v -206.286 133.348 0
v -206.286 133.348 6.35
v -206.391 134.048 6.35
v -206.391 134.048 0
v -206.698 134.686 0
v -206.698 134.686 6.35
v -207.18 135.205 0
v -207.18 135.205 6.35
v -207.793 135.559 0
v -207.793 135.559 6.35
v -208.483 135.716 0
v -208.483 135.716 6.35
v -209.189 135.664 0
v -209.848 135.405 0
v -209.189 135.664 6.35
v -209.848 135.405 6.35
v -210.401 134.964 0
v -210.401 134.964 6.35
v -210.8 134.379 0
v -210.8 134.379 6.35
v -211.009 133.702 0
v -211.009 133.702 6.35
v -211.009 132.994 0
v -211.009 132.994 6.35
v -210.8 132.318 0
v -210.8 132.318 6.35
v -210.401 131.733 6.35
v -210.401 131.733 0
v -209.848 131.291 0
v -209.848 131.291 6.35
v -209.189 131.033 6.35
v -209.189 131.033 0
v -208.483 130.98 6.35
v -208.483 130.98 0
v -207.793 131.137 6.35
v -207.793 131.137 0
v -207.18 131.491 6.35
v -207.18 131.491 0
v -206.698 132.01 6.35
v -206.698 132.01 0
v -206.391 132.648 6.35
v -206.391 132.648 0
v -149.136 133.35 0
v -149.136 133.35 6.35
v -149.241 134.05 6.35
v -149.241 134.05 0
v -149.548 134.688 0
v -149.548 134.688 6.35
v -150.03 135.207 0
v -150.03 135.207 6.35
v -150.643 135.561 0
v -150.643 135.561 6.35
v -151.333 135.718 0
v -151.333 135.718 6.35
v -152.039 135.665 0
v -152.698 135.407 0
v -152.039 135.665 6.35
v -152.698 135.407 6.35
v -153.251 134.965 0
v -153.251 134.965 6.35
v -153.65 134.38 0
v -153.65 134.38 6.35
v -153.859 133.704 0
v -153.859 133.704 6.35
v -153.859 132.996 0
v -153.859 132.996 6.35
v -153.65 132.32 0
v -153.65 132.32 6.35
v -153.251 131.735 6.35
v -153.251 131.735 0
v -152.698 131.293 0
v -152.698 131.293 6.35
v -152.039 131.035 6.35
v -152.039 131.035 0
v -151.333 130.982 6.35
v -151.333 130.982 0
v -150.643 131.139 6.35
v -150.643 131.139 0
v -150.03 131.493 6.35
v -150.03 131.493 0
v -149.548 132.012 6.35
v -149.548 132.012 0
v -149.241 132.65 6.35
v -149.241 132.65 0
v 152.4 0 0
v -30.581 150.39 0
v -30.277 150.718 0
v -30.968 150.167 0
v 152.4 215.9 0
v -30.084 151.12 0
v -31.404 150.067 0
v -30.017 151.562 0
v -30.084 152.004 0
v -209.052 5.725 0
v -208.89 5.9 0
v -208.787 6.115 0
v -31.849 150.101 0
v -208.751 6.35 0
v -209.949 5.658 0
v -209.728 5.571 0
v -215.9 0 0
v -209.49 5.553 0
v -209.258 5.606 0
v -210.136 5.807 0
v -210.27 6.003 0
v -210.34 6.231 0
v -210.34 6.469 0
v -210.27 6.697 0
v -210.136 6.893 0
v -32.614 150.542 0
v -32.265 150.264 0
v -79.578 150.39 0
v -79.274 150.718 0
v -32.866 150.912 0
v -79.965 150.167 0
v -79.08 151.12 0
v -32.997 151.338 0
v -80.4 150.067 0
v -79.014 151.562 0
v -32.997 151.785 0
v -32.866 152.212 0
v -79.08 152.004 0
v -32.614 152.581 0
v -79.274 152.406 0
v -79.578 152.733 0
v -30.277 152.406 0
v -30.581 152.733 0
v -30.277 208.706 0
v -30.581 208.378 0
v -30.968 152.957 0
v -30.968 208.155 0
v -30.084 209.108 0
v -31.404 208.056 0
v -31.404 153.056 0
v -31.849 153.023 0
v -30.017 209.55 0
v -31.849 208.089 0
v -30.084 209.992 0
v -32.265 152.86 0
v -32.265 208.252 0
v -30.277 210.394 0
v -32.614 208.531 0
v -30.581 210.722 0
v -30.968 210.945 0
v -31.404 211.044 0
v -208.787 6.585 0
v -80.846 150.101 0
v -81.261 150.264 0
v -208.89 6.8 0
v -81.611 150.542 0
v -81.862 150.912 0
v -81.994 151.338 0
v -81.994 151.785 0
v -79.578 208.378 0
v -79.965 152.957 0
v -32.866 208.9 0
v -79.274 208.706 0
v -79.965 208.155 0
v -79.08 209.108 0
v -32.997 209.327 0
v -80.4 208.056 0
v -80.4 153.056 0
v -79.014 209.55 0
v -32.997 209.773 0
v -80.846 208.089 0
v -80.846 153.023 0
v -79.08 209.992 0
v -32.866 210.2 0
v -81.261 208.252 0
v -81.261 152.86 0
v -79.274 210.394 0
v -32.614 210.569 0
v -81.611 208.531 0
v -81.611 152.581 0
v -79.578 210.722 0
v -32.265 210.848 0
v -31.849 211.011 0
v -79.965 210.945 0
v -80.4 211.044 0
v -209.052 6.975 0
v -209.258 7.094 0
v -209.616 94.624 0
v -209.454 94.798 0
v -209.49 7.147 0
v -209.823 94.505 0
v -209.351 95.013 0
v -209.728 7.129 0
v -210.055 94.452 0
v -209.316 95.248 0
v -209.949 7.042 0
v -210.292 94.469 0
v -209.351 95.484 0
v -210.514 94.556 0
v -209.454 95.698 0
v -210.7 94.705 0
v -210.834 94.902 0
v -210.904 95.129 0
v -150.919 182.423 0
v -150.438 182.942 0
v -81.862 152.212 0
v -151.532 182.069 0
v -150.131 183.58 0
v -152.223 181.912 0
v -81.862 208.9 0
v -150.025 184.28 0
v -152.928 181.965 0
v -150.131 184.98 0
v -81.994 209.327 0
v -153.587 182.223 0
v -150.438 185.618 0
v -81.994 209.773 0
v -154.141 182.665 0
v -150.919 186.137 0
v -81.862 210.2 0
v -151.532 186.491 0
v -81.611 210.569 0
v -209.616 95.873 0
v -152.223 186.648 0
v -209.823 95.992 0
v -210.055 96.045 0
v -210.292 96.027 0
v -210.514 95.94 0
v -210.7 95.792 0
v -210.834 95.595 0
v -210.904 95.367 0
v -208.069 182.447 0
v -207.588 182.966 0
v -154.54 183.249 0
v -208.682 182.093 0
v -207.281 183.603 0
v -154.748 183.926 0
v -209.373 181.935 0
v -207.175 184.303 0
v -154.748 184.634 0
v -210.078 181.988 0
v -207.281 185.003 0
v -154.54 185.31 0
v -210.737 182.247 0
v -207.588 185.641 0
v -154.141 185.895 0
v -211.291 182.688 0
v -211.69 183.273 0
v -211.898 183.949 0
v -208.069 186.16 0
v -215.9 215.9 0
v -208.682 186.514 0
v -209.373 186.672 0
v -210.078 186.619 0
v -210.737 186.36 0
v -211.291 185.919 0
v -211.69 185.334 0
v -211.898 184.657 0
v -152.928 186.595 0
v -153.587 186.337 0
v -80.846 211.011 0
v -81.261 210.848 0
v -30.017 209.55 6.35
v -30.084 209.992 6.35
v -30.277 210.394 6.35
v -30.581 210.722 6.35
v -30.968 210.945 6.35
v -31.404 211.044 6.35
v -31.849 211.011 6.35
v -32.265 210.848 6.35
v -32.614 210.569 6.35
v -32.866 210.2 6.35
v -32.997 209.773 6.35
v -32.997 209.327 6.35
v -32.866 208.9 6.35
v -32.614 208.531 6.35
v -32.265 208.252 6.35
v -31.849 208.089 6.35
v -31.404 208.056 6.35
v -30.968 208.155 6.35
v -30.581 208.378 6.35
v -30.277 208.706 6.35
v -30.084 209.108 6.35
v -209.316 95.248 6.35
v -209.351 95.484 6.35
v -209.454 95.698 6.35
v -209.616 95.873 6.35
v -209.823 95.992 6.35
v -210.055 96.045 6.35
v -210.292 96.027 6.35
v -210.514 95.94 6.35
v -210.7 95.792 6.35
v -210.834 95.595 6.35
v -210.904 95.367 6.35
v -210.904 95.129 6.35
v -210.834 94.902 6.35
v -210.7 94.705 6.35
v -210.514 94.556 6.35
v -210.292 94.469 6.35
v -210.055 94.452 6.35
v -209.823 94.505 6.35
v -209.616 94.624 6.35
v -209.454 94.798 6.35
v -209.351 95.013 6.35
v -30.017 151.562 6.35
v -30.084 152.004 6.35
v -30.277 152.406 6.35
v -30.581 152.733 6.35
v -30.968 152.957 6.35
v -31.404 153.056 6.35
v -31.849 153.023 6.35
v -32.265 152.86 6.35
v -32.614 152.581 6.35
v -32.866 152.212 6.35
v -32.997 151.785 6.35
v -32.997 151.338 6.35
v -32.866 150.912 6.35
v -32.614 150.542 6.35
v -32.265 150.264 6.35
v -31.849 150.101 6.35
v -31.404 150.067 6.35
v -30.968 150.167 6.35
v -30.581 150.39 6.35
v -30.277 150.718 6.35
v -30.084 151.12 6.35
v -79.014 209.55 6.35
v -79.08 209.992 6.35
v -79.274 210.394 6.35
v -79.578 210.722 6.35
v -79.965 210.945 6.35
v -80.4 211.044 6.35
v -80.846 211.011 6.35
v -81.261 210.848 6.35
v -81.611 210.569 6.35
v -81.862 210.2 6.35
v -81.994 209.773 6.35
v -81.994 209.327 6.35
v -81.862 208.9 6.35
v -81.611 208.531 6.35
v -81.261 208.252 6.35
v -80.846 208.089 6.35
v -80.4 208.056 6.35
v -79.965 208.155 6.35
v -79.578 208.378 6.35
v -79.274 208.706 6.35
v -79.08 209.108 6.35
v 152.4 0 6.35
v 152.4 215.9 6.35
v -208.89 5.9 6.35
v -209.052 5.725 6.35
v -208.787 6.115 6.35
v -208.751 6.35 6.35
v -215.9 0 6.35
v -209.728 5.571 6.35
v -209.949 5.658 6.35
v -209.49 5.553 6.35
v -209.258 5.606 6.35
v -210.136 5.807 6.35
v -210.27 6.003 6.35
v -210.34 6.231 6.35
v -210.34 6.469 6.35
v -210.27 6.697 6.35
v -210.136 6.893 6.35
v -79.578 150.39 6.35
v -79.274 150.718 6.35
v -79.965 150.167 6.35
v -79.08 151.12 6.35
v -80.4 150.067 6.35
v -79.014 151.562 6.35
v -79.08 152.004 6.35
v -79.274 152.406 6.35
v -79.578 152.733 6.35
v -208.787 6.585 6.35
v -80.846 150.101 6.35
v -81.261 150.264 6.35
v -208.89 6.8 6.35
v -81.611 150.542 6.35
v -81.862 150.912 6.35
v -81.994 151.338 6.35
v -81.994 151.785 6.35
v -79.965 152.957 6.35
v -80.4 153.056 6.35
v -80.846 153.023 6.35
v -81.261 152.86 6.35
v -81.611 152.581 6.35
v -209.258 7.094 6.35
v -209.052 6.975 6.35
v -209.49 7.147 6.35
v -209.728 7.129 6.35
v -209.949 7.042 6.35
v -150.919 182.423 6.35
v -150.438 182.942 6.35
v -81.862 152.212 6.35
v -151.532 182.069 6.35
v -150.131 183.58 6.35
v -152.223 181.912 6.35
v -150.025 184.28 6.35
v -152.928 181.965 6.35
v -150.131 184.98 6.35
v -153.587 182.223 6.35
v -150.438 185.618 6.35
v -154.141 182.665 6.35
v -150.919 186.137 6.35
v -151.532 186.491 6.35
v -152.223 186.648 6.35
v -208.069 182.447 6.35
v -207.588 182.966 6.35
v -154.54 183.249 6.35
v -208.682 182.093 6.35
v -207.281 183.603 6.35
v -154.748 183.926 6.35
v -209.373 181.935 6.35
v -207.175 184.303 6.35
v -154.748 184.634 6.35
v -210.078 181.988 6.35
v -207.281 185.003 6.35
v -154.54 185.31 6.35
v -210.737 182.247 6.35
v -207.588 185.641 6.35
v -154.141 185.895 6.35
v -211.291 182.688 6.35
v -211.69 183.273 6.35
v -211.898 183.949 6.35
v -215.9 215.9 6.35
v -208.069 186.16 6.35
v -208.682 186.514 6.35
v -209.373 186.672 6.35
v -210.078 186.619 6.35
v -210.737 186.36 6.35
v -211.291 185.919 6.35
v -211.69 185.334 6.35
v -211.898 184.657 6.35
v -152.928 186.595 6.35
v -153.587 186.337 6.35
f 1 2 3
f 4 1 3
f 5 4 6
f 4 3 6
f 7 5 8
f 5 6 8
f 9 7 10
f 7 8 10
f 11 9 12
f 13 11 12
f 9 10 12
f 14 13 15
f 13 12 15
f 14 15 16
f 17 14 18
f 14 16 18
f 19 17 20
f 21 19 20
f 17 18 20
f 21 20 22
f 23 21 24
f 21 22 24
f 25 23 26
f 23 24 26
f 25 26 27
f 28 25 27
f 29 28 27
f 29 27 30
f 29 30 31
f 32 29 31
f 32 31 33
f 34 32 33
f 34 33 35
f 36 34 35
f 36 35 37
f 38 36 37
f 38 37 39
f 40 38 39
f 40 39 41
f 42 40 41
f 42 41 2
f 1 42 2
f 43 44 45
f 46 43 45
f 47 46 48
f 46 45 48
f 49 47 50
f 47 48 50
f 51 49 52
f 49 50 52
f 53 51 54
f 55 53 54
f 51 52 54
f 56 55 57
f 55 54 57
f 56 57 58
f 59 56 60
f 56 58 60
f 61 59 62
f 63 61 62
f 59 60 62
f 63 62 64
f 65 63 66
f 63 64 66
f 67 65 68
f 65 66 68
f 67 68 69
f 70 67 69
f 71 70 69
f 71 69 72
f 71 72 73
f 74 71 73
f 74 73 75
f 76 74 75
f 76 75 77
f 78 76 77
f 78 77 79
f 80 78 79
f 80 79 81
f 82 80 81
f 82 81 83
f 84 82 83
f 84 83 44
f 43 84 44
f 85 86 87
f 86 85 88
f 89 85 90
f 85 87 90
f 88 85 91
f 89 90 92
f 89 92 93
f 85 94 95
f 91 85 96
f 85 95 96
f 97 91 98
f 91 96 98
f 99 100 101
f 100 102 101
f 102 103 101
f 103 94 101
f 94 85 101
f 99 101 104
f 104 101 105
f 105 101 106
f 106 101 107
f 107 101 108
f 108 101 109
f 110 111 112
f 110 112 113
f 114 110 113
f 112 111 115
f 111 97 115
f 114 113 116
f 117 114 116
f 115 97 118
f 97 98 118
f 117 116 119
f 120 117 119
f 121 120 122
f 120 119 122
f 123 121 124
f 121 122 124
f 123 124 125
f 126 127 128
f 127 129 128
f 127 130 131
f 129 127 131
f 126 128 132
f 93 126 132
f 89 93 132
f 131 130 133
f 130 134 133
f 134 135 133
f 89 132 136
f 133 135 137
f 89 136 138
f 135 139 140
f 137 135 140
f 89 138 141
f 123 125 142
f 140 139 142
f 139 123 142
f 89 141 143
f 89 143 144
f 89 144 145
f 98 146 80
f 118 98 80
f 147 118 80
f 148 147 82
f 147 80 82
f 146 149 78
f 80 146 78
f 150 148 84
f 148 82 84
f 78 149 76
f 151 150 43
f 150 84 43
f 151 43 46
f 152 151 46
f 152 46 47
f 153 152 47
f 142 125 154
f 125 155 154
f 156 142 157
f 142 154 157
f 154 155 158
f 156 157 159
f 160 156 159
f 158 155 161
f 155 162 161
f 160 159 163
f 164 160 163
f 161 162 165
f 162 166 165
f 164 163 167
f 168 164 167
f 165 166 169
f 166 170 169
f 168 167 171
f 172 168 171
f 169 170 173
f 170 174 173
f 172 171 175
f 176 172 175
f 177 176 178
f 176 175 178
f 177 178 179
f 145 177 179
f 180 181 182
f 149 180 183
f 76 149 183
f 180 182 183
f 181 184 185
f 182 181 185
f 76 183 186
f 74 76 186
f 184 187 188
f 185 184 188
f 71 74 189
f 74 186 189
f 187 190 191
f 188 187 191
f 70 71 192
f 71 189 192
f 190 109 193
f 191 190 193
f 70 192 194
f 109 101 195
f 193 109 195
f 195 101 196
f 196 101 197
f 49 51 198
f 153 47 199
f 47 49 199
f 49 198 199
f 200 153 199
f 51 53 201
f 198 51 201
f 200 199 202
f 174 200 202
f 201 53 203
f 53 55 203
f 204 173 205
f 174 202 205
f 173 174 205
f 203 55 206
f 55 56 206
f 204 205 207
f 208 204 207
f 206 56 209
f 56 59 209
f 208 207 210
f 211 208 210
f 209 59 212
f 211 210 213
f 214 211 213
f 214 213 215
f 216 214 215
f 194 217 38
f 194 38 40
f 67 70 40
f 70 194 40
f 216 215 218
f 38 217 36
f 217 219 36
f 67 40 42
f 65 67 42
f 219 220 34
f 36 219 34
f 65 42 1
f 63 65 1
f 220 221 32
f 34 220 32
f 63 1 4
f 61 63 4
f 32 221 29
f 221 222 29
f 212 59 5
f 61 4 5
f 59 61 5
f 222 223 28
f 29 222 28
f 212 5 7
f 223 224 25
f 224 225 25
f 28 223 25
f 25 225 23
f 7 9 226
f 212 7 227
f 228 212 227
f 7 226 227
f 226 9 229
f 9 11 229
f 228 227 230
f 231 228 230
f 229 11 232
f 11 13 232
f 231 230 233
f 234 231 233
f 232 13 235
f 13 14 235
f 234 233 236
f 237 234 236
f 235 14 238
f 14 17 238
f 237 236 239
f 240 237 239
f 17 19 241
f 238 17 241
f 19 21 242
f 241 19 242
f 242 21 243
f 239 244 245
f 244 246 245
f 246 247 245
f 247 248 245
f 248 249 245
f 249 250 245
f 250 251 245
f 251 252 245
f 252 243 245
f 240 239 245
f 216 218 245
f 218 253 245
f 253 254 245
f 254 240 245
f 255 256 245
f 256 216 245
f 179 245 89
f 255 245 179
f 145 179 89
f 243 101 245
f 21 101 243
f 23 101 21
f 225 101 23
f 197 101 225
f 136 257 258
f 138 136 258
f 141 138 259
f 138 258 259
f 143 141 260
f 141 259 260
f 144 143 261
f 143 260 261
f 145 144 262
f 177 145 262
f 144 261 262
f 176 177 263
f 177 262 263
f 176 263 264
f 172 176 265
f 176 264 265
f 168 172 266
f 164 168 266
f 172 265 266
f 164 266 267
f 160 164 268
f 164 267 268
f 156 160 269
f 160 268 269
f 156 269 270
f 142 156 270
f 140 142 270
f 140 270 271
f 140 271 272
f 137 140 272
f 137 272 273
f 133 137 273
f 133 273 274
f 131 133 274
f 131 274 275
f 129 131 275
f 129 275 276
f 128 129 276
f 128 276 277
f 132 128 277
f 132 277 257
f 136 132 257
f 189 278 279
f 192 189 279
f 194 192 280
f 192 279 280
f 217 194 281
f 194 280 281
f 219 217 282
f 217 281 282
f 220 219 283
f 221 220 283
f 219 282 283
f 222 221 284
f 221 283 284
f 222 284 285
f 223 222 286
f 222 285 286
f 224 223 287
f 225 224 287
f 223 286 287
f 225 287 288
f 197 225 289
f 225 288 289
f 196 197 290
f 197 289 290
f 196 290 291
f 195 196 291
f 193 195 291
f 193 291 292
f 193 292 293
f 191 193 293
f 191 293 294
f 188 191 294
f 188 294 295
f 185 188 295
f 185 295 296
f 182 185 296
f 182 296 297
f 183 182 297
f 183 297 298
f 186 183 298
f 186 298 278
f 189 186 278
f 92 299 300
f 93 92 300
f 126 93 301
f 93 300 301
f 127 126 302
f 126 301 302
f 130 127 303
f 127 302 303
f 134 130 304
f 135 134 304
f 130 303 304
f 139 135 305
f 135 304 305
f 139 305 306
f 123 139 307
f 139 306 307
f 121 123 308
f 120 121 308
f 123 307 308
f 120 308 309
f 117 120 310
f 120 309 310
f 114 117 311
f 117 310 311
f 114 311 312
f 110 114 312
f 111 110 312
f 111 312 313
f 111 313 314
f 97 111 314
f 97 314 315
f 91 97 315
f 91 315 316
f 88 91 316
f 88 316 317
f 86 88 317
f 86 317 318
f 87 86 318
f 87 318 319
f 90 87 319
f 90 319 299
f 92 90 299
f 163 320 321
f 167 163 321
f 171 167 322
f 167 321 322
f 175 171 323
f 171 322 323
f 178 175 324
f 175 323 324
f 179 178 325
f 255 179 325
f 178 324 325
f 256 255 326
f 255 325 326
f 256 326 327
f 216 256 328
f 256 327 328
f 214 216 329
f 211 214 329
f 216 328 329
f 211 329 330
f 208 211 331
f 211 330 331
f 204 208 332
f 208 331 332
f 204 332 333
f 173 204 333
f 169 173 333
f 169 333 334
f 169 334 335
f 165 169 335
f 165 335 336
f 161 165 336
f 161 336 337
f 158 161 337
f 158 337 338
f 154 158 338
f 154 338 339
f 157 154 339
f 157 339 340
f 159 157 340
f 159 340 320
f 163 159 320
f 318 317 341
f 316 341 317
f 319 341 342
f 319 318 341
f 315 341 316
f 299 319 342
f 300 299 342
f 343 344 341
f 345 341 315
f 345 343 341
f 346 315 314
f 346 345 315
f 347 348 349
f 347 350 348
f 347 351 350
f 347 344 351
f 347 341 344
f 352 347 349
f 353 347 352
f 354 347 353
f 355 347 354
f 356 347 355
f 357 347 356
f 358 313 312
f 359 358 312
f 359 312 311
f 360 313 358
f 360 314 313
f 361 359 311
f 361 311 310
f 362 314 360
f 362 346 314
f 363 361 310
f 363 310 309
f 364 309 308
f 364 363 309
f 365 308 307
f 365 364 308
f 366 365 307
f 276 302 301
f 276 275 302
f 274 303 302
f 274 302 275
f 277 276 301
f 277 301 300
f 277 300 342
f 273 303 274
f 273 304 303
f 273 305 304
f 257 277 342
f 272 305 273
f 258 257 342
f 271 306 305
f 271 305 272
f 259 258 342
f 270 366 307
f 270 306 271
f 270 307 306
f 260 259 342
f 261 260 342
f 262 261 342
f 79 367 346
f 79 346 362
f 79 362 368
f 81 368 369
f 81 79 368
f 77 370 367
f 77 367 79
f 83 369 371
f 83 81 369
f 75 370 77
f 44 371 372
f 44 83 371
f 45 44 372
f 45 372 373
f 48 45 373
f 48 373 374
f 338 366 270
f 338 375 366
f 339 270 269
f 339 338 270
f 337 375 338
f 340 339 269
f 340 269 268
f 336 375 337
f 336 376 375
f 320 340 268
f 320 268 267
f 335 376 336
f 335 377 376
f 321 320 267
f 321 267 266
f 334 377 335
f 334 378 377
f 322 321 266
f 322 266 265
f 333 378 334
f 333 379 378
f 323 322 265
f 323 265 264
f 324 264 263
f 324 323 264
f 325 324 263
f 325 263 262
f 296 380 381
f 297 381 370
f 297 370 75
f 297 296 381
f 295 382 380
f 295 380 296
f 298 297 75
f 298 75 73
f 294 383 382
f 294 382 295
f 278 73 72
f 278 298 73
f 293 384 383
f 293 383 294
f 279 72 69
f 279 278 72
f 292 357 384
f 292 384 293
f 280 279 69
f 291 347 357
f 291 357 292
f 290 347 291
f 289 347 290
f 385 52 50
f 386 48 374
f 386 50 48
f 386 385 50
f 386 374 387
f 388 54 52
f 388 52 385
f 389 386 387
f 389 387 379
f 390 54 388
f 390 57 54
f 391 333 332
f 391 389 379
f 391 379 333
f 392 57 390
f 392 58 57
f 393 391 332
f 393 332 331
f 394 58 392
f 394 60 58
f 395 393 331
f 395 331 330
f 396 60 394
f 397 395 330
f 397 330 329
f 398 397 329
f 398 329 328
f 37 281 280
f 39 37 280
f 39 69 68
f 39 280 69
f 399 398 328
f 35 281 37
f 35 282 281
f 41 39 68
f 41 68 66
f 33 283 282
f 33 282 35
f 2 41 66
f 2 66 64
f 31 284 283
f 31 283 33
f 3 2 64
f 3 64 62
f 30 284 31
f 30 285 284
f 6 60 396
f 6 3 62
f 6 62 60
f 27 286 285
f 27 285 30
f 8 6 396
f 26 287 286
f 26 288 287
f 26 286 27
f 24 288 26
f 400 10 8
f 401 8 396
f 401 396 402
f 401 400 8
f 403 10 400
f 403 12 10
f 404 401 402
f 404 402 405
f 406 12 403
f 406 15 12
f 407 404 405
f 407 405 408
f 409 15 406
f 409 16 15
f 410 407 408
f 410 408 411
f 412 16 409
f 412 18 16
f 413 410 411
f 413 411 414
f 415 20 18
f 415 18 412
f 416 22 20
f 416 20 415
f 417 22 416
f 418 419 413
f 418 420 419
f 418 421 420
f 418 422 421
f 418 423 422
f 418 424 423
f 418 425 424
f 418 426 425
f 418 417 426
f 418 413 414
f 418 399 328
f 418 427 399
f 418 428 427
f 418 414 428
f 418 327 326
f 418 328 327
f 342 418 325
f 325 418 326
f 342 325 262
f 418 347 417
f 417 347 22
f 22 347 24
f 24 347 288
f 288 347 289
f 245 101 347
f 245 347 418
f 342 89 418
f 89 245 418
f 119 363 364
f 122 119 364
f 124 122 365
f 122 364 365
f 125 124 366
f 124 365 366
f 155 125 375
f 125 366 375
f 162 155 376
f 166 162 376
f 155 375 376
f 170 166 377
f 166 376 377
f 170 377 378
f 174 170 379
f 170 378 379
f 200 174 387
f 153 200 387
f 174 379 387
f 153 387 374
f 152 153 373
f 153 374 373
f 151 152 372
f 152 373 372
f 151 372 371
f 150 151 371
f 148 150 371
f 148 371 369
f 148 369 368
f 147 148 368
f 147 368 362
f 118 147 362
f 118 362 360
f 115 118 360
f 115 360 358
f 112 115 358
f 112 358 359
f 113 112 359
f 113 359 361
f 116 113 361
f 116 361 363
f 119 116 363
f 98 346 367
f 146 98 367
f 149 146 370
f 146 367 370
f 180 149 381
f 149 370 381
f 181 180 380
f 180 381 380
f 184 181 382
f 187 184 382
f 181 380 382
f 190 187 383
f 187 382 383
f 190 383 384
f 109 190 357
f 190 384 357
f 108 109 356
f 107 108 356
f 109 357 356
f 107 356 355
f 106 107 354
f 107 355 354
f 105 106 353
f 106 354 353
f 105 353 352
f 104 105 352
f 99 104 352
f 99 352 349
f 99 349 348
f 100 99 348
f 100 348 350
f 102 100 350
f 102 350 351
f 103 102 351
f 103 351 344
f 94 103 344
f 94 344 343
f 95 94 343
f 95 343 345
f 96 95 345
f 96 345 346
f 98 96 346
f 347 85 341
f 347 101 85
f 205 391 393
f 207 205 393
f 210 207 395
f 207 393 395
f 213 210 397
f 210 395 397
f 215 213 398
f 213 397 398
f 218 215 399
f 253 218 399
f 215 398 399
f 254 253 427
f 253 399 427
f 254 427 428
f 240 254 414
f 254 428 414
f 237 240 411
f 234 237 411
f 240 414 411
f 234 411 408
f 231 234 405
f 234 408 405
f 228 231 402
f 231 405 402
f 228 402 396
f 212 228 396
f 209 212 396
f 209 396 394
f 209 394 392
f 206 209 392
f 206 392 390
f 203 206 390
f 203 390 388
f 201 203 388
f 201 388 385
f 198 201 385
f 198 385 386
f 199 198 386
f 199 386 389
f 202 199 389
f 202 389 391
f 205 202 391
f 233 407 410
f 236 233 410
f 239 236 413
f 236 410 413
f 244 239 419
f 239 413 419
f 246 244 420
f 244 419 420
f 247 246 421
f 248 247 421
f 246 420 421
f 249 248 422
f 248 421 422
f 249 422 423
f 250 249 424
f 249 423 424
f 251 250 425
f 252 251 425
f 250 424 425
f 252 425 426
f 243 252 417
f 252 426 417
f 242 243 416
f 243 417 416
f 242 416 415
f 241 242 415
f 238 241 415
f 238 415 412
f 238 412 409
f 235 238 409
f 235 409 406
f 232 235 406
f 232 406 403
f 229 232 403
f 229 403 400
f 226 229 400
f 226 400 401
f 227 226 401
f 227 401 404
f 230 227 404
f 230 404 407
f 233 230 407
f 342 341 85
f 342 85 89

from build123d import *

# Parameters (mm, degrees)
SKETCH1_W           = 215.9
SKETCH1_H           = 215.9
BOSS_EXTRUDE1_DEPTH = 6.35
SKETCH2_R           = 0.79883
CUT_EXTRUDE1_DEPTH  = 7.35
SKETCH3_R           = 2.3749
CUT_EXTRUDE2_DEPTH  = 7.35
SKETCH4_R           = 1.4986
CUT_EXTRUDE4_DEPTH  = 7.35
SKETCH5_W           = 215.9
SKETCH5_H           = 6.35
BOSS_EXTRUDE2_DEPTH = 152.4


with BuildPart() as part:
    # Sketch1 → Boss-Extrude1 (new body)
    with BuildSketch(Plane(origin=(0, 0, 0), x_dir=(0, 1, 0), z_dir=(0, 0, 1))):
        with Locations((107.95, 107.95)):
            Rectangle(SKETCH1_W, SKETCH1_H)
    extrude(amount=BOSS_EXTRUDE1_DEPTH)

    # Sketch2 → Cut-Extrude1 (cut, through all)
    with BuildSketch(Plane.XY.offset(6.35)):
        with Locations((-209.55, 6.35)):
            Circle(SKETCH2_R)
        with Locations((-210.114382122, 95.24820849)):
            Circle(SKETCH2_R)
    extrude(amount=-CUT_EXTRUDE1_DEPTH, mode=Mode.SUBTRACT)

    # Sketch3 → Cut-Extrude2 (cut, through all)
    with BuildSketch(Plane.XY.offset(6.35)):
        with Locations((-209.55, 184.30334861)):
            Circle(SKETCH3_R)
        with Locations((-208.660508776, 133.34820849)):
            Circle(SKETCH3_R)
        with Locations((-152.400004812, 184.27989595)):
            Circle(SKETCH3_R)
        with Locations((-151.510508804, 133.349999963)):
            Circle(SKETCH3_R)
    extrude(amount=-CUT_EXTRUDE2_DEPTH, mode=Mode.SUBTRACT)

    # Sketch4 → Cut-Extrude4 (cut, through all)
    with BuildSketch(Plane.XY.offset(6.35)):
        with Locations((-80.512162715, 209.55)):
            Circle(SKETCH4_R)
        with Locations((-31.515562715, 209.55)):
            Circle(SKETCH4_R)
        with Locations((-80.512162715, 151.5618)):
            Circle(SKETCH4_R)
        with Locations((-31.515562715, 151.5618)):
            Circle(SKETCH4_R)
    extrude(amount=-CUT_EXTRUDE4_DEPTH, mode=Mode.SUBTRACT)

    # Sketch5 → Boss-Extrude2 (add)
    with BuildSketch(Plane.YZ):
        with Locations((107.95, 3.175)):
            Rectangle(SKETCH5_W, SKETCH5_H)
    extrude(amount=BOSS_EXTRUDE2_DEPTH)


solid = part.part
